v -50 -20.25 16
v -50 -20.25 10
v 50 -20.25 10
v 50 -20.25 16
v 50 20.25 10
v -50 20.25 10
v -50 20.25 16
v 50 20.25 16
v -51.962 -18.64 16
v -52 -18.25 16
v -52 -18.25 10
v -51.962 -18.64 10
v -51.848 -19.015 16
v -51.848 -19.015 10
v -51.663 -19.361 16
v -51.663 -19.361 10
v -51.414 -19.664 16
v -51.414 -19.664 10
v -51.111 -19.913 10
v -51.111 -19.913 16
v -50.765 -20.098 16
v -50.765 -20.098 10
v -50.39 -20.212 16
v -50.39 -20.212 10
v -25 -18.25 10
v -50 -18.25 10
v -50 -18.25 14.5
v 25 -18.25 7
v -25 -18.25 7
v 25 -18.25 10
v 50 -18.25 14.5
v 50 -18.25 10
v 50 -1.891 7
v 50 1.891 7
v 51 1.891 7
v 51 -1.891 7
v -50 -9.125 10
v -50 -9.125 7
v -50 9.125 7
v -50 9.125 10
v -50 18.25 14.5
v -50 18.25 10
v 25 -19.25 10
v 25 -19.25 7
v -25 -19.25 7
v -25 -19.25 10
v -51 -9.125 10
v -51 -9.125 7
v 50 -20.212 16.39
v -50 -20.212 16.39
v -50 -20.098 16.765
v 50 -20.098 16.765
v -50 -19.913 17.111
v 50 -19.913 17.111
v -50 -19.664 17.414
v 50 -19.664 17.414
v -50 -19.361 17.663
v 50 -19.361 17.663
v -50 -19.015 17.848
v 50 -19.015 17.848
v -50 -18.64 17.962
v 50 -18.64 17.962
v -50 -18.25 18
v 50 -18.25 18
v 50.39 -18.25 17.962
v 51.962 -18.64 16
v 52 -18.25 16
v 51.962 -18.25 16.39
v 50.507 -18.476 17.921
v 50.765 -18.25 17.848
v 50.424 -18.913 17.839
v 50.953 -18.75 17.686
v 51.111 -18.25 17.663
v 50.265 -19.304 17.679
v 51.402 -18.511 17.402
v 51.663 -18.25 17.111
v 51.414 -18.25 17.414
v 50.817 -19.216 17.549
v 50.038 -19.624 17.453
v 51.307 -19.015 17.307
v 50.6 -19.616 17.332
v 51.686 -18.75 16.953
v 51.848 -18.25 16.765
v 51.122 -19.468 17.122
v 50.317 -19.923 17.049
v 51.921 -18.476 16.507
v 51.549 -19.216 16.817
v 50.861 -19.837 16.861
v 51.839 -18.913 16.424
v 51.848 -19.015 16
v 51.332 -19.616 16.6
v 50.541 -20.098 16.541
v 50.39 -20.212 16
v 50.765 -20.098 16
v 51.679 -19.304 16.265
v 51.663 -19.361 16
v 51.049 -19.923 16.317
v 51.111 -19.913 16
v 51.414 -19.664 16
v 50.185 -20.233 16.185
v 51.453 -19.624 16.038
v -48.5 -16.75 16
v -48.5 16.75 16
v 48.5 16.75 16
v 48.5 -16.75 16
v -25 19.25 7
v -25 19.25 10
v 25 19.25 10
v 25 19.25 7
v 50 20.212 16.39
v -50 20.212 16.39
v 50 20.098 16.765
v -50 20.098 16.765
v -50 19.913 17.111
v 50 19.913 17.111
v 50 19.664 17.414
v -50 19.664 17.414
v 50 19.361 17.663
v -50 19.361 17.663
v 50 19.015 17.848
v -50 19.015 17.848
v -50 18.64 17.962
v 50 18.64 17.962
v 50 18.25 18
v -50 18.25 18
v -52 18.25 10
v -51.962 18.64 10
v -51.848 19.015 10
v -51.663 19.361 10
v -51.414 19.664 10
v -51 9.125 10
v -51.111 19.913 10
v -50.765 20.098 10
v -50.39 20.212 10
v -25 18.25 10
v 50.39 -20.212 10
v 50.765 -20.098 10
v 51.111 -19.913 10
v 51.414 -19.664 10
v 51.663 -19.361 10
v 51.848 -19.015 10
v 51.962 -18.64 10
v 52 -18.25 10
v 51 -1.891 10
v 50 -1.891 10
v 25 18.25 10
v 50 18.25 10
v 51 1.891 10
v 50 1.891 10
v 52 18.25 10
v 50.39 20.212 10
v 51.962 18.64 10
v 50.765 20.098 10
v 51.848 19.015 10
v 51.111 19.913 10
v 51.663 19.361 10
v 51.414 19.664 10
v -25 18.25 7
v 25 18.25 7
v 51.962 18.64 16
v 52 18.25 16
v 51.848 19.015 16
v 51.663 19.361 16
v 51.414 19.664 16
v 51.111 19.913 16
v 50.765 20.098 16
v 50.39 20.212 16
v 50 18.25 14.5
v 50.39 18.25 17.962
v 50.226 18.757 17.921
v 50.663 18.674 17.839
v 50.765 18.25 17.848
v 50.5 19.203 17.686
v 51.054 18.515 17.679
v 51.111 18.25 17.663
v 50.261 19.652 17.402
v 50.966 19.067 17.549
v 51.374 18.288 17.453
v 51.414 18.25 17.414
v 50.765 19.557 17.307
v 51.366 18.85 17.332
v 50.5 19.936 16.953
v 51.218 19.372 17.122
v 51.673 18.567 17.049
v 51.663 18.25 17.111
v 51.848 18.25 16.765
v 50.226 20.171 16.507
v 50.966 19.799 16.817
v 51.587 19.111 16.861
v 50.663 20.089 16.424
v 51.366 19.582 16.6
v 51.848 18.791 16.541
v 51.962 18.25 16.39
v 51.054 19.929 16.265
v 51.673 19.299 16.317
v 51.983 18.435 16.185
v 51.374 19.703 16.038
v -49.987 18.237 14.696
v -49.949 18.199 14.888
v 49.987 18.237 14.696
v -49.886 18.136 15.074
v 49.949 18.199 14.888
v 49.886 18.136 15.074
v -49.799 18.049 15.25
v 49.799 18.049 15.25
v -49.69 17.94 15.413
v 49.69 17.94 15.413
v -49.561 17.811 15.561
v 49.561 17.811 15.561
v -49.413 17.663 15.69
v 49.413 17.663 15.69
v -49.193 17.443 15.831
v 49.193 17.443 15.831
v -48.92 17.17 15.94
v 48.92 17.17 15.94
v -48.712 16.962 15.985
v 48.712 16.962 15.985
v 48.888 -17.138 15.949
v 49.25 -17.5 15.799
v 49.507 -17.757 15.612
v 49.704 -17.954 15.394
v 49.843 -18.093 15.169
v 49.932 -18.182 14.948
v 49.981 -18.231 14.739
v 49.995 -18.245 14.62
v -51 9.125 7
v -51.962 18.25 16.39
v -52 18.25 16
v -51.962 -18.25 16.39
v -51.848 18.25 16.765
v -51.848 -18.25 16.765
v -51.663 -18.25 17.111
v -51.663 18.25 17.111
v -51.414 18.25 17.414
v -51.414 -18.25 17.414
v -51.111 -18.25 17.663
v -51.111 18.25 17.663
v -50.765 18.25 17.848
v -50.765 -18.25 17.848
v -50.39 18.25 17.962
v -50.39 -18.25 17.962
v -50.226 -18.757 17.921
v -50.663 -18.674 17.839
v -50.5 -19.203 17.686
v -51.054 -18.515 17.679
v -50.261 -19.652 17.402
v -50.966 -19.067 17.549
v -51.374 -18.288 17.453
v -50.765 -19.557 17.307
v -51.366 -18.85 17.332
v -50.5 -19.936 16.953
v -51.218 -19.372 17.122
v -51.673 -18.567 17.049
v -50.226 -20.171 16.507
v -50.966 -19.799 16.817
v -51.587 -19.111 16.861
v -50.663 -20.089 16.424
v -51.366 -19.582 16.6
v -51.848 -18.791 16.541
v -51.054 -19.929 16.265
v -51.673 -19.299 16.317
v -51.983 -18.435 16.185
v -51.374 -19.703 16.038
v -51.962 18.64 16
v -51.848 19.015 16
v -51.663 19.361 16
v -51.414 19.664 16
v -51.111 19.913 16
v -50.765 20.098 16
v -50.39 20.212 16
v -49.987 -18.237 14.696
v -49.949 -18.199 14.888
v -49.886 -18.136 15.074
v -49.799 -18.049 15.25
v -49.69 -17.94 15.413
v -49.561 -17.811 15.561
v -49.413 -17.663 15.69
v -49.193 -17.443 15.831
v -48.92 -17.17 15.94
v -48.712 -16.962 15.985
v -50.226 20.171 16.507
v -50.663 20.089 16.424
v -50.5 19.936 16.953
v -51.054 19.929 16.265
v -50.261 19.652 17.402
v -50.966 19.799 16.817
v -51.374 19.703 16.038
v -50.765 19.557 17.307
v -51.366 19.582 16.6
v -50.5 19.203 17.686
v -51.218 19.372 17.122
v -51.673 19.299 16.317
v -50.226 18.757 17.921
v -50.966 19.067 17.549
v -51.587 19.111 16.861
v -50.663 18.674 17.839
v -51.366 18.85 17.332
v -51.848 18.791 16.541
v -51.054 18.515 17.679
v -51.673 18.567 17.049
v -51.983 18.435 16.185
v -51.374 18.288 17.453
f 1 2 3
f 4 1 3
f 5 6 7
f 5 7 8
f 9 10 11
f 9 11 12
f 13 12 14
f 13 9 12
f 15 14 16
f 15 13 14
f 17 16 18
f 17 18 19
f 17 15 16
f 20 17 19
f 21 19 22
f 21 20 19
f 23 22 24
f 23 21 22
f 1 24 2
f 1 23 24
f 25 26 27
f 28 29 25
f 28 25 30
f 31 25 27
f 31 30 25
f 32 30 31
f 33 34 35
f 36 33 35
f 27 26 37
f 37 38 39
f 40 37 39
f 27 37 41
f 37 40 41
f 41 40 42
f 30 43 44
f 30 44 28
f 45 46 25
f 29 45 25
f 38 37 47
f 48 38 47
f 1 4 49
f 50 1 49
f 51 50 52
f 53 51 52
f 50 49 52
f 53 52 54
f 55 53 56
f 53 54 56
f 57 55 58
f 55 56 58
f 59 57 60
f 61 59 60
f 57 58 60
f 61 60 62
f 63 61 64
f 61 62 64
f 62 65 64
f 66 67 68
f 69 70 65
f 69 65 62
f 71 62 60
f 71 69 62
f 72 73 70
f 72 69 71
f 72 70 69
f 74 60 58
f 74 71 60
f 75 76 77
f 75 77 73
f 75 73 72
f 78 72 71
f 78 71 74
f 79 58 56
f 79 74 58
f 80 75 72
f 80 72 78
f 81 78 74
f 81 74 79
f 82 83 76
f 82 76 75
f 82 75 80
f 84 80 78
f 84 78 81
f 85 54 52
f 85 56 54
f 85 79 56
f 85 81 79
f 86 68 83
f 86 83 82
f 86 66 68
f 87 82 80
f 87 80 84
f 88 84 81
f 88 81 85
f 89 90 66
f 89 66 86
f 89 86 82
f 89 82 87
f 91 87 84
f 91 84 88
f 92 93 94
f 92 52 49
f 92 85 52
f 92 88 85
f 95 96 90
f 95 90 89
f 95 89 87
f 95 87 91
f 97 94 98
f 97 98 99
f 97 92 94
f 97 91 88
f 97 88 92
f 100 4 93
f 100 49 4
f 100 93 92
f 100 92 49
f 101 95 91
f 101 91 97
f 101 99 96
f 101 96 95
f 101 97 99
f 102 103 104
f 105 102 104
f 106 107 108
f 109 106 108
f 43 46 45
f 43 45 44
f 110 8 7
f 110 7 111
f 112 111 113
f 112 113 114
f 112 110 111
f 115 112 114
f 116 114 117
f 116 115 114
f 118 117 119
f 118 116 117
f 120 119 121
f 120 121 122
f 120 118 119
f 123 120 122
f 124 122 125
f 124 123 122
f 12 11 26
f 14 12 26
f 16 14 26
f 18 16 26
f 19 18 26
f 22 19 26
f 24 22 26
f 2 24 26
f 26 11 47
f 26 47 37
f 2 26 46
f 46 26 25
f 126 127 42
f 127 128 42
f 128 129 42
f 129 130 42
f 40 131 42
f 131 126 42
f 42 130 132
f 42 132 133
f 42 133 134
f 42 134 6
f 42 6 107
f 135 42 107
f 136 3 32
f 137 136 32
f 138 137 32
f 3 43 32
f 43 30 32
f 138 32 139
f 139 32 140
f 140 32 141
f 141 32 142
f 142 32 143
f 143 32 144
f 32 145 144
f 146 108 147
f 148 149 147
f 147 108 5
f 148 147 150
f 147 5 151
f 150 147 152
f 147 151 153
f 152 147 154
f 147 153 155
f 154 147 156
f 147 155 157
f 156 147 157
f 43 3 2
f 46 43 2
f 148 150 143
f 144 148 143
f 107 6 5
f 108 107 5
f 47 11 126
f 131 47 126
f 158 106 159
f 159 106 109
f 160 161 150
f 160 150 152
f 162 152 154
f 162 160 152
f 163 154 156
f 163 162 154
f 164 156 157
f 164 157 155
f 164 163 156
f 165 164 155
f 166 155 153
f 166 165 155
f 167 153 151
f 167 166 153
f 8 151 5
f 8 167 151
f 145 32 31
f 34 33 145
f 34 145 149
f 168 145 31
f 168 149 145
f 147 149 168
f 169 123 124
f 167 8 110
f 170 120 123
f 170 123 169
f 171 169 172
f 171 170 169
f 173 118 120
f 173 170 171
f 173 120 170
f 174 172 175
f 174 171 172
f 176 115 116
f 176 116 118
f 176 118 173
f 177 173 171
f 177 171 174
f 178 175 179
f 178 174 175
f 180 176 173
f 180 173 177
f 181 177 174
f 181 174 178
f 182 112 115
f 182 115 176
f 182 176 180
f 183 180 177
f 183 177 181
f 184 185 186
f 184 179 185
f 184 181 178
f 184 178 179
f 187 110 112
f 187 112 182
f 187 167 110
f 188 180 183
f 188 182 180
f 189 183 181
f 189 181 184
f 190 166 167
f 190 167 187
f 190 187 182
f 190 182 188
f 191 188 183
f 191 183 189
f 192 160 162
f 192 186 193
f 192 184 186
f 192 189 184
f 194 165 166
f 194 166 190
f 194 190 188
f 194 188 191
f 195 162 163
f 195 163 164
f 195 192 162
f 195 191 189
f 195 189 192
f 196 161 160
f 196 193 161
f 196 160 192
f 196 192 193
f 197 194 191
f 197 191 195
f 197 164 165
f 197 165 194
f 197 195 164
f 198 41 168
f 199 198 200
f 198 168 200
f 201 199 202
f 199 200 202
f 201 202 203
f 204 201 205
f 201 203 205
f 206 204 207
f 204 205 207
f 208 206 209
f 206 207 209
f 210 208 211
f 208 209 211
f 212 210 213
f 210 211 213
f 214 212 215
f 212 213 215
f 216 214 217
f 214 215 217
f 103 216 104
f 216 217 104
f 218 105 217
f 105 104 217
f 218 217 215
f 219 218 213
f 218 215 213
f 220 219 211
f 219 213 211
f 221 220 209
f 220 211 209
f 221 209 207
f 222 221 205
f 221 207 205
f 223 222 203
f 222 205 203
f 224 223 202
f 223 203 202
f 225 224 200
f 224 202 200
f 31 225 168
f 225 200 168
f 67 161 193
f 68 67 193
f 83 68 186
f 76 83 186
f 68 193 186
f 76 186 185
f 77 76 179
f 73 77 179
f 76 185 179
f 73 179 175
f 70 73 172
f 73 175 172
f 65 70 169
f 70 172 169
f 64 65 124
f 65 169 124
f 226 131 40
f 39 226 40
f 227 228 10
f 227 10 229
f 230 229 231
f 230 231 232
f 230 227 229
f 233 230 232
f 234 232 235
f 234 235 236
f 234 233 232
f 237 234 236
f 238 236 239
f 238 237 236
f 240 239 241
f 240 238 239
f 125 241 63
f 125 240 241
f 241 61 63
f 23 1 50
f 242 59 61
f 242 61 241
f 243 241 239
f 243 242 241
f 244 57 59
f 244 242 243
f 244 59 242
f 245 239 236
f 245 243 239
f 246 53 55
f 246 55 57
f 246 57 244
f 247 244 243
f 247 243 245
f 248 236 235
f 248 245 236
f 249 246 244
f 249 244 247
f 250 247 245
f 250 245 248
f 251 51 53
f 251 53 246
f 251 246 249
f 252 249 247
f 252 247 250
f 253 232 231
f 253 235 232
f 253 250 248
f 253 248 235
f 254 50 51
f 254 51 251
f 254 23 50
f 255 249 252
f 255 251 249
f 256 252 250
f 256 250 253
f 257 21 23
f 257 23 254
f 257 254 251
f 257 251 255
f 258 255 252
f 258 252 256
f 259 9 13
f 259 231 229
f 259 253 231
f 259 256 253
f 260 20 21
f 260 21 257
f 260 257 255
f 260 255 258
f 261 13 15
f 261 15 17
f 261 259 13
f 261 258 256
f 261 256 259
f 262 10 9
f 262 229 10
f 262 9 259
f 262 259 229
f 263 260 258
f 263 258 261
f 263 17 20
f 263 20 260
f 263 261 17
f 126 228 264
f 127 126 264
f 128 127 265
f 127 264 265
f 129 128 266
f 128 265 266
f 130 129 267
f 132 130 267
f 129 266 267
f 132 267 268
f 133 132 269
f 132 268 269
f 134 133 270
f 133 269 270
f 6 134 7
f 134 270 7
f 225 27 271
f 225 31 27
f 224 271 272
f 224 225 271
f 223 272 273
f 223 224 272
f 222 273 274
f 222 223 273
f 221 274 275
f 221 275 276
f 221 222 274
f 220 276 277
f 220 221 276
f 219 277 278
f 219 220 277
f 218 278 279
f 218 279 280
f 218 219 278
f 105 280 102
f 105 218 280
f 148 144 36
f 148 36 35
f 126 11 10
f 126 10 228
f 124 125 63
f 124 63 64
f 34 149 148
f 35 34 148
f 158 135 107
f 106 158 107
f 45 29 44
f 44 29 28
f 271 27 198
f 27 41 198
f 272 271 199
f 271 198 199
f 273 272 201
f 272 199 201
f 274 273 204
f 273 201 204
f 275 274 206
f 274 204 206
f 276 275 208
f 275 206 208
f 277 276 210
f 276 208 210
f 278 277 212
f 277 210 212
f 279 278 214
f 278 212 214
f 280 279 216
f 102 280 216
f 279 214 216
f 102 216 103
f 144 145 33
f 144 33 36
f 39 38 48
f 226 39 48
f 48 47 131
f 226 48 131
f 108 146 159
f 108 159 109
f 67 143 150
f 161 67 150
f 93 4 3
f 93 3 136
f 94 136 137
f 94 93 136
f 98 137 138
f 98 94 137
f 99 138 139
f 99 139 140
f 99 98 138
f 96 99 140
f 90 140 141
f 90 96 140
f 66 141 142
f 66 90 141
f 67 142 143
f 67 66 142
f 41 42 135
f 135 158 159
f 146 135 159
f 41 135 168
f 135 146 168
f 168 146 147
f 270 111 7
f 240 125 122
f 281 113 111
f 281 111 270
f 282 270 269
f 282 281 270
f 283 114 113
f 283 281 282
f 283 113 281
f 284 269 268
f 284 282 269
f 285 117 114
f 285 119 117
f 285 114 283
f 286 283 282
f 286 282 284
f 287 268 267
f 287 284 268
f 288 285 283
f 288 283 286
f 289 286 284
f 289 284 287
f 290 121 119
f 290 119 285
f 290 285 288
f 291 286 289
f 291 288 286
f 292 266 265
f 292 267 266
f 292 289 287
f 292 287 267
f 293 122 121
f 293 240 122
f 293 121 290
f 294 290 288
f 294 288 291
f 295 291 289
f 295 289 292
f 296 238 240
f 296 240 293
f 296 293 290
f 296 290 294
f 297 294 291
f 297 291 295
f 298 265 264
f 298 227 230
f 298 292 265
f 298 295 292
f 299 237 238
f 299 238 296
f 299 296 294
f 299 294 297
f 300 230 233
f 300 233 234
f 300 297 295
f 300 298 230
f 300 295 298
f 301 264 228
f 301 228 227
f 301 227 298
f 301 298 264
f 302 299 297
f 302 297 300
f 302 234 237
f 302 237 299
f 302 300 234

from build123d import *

# Parameters (mm, degrees)
SKETCH014_W    = 100
SKETCH014_H    = 36.5
PAD011_DEPTH   = 6
THICKNESS002_T = 2
SKETCH015_W    = 50
SKETCH015_H    = 1
SKETCH015_W_2  = 1
SKETCH015_H_2  = 3.782178
PAD012_DEPTH   = 3
FILLET004_R    = 1.5


with BuildPart() as part:
    # Sketch014 → Pad011 (new body)
    with BuildSketch(Plane.XY):
        Rectangle(SKETCH014_W, SKETCH014_H)
    extrude(amount=PAD011_DEPTH)

    # Thickness002
    thickness002_openings = [part.faces().sort_by_distance(p)[0] for p in [
        (0, 0, 0),
    ]]
    offset(amount=THICKNESS002_T, openings=thickness002_openings)

    # Sketch015 → Pad012 (join)
    with BuildSketch(Plane.XY):
        with Locations((0, -18.75)):
            Rectangle(SKETCH015_W, SKETCH015_H)
        with Locations((50.5, 0)):
            Rectangle(SKETCH015_W_2, SKETCH015_H_2)
        with Locations((0, 18.75)):
            Rectangle(SKETCH015_W, SKETCH015_H)
        Polygon((-50, -9.125126), (-51, -9.124874), (-51, 9.125126), (-50, 9.125126), align=None)
    extrude(amount=-PAD012_DEPTH)

    # Fillet004
    fillet004_edges = [part.edges().sort_by_distance(p)[0] for p in [
        (0, 18.25, 6),
        (50, 0, 6),
        (0, -18.25, 6),
        (-50, 0, 6),
    ]]
    fillet(fillet004_edges, radius=FILLET004_R)


with BuildPart() as part_1:
    # Body004 placement: moved
    add(part.part.moved(Location((0, 0, 10))))


solid = part_1.part
